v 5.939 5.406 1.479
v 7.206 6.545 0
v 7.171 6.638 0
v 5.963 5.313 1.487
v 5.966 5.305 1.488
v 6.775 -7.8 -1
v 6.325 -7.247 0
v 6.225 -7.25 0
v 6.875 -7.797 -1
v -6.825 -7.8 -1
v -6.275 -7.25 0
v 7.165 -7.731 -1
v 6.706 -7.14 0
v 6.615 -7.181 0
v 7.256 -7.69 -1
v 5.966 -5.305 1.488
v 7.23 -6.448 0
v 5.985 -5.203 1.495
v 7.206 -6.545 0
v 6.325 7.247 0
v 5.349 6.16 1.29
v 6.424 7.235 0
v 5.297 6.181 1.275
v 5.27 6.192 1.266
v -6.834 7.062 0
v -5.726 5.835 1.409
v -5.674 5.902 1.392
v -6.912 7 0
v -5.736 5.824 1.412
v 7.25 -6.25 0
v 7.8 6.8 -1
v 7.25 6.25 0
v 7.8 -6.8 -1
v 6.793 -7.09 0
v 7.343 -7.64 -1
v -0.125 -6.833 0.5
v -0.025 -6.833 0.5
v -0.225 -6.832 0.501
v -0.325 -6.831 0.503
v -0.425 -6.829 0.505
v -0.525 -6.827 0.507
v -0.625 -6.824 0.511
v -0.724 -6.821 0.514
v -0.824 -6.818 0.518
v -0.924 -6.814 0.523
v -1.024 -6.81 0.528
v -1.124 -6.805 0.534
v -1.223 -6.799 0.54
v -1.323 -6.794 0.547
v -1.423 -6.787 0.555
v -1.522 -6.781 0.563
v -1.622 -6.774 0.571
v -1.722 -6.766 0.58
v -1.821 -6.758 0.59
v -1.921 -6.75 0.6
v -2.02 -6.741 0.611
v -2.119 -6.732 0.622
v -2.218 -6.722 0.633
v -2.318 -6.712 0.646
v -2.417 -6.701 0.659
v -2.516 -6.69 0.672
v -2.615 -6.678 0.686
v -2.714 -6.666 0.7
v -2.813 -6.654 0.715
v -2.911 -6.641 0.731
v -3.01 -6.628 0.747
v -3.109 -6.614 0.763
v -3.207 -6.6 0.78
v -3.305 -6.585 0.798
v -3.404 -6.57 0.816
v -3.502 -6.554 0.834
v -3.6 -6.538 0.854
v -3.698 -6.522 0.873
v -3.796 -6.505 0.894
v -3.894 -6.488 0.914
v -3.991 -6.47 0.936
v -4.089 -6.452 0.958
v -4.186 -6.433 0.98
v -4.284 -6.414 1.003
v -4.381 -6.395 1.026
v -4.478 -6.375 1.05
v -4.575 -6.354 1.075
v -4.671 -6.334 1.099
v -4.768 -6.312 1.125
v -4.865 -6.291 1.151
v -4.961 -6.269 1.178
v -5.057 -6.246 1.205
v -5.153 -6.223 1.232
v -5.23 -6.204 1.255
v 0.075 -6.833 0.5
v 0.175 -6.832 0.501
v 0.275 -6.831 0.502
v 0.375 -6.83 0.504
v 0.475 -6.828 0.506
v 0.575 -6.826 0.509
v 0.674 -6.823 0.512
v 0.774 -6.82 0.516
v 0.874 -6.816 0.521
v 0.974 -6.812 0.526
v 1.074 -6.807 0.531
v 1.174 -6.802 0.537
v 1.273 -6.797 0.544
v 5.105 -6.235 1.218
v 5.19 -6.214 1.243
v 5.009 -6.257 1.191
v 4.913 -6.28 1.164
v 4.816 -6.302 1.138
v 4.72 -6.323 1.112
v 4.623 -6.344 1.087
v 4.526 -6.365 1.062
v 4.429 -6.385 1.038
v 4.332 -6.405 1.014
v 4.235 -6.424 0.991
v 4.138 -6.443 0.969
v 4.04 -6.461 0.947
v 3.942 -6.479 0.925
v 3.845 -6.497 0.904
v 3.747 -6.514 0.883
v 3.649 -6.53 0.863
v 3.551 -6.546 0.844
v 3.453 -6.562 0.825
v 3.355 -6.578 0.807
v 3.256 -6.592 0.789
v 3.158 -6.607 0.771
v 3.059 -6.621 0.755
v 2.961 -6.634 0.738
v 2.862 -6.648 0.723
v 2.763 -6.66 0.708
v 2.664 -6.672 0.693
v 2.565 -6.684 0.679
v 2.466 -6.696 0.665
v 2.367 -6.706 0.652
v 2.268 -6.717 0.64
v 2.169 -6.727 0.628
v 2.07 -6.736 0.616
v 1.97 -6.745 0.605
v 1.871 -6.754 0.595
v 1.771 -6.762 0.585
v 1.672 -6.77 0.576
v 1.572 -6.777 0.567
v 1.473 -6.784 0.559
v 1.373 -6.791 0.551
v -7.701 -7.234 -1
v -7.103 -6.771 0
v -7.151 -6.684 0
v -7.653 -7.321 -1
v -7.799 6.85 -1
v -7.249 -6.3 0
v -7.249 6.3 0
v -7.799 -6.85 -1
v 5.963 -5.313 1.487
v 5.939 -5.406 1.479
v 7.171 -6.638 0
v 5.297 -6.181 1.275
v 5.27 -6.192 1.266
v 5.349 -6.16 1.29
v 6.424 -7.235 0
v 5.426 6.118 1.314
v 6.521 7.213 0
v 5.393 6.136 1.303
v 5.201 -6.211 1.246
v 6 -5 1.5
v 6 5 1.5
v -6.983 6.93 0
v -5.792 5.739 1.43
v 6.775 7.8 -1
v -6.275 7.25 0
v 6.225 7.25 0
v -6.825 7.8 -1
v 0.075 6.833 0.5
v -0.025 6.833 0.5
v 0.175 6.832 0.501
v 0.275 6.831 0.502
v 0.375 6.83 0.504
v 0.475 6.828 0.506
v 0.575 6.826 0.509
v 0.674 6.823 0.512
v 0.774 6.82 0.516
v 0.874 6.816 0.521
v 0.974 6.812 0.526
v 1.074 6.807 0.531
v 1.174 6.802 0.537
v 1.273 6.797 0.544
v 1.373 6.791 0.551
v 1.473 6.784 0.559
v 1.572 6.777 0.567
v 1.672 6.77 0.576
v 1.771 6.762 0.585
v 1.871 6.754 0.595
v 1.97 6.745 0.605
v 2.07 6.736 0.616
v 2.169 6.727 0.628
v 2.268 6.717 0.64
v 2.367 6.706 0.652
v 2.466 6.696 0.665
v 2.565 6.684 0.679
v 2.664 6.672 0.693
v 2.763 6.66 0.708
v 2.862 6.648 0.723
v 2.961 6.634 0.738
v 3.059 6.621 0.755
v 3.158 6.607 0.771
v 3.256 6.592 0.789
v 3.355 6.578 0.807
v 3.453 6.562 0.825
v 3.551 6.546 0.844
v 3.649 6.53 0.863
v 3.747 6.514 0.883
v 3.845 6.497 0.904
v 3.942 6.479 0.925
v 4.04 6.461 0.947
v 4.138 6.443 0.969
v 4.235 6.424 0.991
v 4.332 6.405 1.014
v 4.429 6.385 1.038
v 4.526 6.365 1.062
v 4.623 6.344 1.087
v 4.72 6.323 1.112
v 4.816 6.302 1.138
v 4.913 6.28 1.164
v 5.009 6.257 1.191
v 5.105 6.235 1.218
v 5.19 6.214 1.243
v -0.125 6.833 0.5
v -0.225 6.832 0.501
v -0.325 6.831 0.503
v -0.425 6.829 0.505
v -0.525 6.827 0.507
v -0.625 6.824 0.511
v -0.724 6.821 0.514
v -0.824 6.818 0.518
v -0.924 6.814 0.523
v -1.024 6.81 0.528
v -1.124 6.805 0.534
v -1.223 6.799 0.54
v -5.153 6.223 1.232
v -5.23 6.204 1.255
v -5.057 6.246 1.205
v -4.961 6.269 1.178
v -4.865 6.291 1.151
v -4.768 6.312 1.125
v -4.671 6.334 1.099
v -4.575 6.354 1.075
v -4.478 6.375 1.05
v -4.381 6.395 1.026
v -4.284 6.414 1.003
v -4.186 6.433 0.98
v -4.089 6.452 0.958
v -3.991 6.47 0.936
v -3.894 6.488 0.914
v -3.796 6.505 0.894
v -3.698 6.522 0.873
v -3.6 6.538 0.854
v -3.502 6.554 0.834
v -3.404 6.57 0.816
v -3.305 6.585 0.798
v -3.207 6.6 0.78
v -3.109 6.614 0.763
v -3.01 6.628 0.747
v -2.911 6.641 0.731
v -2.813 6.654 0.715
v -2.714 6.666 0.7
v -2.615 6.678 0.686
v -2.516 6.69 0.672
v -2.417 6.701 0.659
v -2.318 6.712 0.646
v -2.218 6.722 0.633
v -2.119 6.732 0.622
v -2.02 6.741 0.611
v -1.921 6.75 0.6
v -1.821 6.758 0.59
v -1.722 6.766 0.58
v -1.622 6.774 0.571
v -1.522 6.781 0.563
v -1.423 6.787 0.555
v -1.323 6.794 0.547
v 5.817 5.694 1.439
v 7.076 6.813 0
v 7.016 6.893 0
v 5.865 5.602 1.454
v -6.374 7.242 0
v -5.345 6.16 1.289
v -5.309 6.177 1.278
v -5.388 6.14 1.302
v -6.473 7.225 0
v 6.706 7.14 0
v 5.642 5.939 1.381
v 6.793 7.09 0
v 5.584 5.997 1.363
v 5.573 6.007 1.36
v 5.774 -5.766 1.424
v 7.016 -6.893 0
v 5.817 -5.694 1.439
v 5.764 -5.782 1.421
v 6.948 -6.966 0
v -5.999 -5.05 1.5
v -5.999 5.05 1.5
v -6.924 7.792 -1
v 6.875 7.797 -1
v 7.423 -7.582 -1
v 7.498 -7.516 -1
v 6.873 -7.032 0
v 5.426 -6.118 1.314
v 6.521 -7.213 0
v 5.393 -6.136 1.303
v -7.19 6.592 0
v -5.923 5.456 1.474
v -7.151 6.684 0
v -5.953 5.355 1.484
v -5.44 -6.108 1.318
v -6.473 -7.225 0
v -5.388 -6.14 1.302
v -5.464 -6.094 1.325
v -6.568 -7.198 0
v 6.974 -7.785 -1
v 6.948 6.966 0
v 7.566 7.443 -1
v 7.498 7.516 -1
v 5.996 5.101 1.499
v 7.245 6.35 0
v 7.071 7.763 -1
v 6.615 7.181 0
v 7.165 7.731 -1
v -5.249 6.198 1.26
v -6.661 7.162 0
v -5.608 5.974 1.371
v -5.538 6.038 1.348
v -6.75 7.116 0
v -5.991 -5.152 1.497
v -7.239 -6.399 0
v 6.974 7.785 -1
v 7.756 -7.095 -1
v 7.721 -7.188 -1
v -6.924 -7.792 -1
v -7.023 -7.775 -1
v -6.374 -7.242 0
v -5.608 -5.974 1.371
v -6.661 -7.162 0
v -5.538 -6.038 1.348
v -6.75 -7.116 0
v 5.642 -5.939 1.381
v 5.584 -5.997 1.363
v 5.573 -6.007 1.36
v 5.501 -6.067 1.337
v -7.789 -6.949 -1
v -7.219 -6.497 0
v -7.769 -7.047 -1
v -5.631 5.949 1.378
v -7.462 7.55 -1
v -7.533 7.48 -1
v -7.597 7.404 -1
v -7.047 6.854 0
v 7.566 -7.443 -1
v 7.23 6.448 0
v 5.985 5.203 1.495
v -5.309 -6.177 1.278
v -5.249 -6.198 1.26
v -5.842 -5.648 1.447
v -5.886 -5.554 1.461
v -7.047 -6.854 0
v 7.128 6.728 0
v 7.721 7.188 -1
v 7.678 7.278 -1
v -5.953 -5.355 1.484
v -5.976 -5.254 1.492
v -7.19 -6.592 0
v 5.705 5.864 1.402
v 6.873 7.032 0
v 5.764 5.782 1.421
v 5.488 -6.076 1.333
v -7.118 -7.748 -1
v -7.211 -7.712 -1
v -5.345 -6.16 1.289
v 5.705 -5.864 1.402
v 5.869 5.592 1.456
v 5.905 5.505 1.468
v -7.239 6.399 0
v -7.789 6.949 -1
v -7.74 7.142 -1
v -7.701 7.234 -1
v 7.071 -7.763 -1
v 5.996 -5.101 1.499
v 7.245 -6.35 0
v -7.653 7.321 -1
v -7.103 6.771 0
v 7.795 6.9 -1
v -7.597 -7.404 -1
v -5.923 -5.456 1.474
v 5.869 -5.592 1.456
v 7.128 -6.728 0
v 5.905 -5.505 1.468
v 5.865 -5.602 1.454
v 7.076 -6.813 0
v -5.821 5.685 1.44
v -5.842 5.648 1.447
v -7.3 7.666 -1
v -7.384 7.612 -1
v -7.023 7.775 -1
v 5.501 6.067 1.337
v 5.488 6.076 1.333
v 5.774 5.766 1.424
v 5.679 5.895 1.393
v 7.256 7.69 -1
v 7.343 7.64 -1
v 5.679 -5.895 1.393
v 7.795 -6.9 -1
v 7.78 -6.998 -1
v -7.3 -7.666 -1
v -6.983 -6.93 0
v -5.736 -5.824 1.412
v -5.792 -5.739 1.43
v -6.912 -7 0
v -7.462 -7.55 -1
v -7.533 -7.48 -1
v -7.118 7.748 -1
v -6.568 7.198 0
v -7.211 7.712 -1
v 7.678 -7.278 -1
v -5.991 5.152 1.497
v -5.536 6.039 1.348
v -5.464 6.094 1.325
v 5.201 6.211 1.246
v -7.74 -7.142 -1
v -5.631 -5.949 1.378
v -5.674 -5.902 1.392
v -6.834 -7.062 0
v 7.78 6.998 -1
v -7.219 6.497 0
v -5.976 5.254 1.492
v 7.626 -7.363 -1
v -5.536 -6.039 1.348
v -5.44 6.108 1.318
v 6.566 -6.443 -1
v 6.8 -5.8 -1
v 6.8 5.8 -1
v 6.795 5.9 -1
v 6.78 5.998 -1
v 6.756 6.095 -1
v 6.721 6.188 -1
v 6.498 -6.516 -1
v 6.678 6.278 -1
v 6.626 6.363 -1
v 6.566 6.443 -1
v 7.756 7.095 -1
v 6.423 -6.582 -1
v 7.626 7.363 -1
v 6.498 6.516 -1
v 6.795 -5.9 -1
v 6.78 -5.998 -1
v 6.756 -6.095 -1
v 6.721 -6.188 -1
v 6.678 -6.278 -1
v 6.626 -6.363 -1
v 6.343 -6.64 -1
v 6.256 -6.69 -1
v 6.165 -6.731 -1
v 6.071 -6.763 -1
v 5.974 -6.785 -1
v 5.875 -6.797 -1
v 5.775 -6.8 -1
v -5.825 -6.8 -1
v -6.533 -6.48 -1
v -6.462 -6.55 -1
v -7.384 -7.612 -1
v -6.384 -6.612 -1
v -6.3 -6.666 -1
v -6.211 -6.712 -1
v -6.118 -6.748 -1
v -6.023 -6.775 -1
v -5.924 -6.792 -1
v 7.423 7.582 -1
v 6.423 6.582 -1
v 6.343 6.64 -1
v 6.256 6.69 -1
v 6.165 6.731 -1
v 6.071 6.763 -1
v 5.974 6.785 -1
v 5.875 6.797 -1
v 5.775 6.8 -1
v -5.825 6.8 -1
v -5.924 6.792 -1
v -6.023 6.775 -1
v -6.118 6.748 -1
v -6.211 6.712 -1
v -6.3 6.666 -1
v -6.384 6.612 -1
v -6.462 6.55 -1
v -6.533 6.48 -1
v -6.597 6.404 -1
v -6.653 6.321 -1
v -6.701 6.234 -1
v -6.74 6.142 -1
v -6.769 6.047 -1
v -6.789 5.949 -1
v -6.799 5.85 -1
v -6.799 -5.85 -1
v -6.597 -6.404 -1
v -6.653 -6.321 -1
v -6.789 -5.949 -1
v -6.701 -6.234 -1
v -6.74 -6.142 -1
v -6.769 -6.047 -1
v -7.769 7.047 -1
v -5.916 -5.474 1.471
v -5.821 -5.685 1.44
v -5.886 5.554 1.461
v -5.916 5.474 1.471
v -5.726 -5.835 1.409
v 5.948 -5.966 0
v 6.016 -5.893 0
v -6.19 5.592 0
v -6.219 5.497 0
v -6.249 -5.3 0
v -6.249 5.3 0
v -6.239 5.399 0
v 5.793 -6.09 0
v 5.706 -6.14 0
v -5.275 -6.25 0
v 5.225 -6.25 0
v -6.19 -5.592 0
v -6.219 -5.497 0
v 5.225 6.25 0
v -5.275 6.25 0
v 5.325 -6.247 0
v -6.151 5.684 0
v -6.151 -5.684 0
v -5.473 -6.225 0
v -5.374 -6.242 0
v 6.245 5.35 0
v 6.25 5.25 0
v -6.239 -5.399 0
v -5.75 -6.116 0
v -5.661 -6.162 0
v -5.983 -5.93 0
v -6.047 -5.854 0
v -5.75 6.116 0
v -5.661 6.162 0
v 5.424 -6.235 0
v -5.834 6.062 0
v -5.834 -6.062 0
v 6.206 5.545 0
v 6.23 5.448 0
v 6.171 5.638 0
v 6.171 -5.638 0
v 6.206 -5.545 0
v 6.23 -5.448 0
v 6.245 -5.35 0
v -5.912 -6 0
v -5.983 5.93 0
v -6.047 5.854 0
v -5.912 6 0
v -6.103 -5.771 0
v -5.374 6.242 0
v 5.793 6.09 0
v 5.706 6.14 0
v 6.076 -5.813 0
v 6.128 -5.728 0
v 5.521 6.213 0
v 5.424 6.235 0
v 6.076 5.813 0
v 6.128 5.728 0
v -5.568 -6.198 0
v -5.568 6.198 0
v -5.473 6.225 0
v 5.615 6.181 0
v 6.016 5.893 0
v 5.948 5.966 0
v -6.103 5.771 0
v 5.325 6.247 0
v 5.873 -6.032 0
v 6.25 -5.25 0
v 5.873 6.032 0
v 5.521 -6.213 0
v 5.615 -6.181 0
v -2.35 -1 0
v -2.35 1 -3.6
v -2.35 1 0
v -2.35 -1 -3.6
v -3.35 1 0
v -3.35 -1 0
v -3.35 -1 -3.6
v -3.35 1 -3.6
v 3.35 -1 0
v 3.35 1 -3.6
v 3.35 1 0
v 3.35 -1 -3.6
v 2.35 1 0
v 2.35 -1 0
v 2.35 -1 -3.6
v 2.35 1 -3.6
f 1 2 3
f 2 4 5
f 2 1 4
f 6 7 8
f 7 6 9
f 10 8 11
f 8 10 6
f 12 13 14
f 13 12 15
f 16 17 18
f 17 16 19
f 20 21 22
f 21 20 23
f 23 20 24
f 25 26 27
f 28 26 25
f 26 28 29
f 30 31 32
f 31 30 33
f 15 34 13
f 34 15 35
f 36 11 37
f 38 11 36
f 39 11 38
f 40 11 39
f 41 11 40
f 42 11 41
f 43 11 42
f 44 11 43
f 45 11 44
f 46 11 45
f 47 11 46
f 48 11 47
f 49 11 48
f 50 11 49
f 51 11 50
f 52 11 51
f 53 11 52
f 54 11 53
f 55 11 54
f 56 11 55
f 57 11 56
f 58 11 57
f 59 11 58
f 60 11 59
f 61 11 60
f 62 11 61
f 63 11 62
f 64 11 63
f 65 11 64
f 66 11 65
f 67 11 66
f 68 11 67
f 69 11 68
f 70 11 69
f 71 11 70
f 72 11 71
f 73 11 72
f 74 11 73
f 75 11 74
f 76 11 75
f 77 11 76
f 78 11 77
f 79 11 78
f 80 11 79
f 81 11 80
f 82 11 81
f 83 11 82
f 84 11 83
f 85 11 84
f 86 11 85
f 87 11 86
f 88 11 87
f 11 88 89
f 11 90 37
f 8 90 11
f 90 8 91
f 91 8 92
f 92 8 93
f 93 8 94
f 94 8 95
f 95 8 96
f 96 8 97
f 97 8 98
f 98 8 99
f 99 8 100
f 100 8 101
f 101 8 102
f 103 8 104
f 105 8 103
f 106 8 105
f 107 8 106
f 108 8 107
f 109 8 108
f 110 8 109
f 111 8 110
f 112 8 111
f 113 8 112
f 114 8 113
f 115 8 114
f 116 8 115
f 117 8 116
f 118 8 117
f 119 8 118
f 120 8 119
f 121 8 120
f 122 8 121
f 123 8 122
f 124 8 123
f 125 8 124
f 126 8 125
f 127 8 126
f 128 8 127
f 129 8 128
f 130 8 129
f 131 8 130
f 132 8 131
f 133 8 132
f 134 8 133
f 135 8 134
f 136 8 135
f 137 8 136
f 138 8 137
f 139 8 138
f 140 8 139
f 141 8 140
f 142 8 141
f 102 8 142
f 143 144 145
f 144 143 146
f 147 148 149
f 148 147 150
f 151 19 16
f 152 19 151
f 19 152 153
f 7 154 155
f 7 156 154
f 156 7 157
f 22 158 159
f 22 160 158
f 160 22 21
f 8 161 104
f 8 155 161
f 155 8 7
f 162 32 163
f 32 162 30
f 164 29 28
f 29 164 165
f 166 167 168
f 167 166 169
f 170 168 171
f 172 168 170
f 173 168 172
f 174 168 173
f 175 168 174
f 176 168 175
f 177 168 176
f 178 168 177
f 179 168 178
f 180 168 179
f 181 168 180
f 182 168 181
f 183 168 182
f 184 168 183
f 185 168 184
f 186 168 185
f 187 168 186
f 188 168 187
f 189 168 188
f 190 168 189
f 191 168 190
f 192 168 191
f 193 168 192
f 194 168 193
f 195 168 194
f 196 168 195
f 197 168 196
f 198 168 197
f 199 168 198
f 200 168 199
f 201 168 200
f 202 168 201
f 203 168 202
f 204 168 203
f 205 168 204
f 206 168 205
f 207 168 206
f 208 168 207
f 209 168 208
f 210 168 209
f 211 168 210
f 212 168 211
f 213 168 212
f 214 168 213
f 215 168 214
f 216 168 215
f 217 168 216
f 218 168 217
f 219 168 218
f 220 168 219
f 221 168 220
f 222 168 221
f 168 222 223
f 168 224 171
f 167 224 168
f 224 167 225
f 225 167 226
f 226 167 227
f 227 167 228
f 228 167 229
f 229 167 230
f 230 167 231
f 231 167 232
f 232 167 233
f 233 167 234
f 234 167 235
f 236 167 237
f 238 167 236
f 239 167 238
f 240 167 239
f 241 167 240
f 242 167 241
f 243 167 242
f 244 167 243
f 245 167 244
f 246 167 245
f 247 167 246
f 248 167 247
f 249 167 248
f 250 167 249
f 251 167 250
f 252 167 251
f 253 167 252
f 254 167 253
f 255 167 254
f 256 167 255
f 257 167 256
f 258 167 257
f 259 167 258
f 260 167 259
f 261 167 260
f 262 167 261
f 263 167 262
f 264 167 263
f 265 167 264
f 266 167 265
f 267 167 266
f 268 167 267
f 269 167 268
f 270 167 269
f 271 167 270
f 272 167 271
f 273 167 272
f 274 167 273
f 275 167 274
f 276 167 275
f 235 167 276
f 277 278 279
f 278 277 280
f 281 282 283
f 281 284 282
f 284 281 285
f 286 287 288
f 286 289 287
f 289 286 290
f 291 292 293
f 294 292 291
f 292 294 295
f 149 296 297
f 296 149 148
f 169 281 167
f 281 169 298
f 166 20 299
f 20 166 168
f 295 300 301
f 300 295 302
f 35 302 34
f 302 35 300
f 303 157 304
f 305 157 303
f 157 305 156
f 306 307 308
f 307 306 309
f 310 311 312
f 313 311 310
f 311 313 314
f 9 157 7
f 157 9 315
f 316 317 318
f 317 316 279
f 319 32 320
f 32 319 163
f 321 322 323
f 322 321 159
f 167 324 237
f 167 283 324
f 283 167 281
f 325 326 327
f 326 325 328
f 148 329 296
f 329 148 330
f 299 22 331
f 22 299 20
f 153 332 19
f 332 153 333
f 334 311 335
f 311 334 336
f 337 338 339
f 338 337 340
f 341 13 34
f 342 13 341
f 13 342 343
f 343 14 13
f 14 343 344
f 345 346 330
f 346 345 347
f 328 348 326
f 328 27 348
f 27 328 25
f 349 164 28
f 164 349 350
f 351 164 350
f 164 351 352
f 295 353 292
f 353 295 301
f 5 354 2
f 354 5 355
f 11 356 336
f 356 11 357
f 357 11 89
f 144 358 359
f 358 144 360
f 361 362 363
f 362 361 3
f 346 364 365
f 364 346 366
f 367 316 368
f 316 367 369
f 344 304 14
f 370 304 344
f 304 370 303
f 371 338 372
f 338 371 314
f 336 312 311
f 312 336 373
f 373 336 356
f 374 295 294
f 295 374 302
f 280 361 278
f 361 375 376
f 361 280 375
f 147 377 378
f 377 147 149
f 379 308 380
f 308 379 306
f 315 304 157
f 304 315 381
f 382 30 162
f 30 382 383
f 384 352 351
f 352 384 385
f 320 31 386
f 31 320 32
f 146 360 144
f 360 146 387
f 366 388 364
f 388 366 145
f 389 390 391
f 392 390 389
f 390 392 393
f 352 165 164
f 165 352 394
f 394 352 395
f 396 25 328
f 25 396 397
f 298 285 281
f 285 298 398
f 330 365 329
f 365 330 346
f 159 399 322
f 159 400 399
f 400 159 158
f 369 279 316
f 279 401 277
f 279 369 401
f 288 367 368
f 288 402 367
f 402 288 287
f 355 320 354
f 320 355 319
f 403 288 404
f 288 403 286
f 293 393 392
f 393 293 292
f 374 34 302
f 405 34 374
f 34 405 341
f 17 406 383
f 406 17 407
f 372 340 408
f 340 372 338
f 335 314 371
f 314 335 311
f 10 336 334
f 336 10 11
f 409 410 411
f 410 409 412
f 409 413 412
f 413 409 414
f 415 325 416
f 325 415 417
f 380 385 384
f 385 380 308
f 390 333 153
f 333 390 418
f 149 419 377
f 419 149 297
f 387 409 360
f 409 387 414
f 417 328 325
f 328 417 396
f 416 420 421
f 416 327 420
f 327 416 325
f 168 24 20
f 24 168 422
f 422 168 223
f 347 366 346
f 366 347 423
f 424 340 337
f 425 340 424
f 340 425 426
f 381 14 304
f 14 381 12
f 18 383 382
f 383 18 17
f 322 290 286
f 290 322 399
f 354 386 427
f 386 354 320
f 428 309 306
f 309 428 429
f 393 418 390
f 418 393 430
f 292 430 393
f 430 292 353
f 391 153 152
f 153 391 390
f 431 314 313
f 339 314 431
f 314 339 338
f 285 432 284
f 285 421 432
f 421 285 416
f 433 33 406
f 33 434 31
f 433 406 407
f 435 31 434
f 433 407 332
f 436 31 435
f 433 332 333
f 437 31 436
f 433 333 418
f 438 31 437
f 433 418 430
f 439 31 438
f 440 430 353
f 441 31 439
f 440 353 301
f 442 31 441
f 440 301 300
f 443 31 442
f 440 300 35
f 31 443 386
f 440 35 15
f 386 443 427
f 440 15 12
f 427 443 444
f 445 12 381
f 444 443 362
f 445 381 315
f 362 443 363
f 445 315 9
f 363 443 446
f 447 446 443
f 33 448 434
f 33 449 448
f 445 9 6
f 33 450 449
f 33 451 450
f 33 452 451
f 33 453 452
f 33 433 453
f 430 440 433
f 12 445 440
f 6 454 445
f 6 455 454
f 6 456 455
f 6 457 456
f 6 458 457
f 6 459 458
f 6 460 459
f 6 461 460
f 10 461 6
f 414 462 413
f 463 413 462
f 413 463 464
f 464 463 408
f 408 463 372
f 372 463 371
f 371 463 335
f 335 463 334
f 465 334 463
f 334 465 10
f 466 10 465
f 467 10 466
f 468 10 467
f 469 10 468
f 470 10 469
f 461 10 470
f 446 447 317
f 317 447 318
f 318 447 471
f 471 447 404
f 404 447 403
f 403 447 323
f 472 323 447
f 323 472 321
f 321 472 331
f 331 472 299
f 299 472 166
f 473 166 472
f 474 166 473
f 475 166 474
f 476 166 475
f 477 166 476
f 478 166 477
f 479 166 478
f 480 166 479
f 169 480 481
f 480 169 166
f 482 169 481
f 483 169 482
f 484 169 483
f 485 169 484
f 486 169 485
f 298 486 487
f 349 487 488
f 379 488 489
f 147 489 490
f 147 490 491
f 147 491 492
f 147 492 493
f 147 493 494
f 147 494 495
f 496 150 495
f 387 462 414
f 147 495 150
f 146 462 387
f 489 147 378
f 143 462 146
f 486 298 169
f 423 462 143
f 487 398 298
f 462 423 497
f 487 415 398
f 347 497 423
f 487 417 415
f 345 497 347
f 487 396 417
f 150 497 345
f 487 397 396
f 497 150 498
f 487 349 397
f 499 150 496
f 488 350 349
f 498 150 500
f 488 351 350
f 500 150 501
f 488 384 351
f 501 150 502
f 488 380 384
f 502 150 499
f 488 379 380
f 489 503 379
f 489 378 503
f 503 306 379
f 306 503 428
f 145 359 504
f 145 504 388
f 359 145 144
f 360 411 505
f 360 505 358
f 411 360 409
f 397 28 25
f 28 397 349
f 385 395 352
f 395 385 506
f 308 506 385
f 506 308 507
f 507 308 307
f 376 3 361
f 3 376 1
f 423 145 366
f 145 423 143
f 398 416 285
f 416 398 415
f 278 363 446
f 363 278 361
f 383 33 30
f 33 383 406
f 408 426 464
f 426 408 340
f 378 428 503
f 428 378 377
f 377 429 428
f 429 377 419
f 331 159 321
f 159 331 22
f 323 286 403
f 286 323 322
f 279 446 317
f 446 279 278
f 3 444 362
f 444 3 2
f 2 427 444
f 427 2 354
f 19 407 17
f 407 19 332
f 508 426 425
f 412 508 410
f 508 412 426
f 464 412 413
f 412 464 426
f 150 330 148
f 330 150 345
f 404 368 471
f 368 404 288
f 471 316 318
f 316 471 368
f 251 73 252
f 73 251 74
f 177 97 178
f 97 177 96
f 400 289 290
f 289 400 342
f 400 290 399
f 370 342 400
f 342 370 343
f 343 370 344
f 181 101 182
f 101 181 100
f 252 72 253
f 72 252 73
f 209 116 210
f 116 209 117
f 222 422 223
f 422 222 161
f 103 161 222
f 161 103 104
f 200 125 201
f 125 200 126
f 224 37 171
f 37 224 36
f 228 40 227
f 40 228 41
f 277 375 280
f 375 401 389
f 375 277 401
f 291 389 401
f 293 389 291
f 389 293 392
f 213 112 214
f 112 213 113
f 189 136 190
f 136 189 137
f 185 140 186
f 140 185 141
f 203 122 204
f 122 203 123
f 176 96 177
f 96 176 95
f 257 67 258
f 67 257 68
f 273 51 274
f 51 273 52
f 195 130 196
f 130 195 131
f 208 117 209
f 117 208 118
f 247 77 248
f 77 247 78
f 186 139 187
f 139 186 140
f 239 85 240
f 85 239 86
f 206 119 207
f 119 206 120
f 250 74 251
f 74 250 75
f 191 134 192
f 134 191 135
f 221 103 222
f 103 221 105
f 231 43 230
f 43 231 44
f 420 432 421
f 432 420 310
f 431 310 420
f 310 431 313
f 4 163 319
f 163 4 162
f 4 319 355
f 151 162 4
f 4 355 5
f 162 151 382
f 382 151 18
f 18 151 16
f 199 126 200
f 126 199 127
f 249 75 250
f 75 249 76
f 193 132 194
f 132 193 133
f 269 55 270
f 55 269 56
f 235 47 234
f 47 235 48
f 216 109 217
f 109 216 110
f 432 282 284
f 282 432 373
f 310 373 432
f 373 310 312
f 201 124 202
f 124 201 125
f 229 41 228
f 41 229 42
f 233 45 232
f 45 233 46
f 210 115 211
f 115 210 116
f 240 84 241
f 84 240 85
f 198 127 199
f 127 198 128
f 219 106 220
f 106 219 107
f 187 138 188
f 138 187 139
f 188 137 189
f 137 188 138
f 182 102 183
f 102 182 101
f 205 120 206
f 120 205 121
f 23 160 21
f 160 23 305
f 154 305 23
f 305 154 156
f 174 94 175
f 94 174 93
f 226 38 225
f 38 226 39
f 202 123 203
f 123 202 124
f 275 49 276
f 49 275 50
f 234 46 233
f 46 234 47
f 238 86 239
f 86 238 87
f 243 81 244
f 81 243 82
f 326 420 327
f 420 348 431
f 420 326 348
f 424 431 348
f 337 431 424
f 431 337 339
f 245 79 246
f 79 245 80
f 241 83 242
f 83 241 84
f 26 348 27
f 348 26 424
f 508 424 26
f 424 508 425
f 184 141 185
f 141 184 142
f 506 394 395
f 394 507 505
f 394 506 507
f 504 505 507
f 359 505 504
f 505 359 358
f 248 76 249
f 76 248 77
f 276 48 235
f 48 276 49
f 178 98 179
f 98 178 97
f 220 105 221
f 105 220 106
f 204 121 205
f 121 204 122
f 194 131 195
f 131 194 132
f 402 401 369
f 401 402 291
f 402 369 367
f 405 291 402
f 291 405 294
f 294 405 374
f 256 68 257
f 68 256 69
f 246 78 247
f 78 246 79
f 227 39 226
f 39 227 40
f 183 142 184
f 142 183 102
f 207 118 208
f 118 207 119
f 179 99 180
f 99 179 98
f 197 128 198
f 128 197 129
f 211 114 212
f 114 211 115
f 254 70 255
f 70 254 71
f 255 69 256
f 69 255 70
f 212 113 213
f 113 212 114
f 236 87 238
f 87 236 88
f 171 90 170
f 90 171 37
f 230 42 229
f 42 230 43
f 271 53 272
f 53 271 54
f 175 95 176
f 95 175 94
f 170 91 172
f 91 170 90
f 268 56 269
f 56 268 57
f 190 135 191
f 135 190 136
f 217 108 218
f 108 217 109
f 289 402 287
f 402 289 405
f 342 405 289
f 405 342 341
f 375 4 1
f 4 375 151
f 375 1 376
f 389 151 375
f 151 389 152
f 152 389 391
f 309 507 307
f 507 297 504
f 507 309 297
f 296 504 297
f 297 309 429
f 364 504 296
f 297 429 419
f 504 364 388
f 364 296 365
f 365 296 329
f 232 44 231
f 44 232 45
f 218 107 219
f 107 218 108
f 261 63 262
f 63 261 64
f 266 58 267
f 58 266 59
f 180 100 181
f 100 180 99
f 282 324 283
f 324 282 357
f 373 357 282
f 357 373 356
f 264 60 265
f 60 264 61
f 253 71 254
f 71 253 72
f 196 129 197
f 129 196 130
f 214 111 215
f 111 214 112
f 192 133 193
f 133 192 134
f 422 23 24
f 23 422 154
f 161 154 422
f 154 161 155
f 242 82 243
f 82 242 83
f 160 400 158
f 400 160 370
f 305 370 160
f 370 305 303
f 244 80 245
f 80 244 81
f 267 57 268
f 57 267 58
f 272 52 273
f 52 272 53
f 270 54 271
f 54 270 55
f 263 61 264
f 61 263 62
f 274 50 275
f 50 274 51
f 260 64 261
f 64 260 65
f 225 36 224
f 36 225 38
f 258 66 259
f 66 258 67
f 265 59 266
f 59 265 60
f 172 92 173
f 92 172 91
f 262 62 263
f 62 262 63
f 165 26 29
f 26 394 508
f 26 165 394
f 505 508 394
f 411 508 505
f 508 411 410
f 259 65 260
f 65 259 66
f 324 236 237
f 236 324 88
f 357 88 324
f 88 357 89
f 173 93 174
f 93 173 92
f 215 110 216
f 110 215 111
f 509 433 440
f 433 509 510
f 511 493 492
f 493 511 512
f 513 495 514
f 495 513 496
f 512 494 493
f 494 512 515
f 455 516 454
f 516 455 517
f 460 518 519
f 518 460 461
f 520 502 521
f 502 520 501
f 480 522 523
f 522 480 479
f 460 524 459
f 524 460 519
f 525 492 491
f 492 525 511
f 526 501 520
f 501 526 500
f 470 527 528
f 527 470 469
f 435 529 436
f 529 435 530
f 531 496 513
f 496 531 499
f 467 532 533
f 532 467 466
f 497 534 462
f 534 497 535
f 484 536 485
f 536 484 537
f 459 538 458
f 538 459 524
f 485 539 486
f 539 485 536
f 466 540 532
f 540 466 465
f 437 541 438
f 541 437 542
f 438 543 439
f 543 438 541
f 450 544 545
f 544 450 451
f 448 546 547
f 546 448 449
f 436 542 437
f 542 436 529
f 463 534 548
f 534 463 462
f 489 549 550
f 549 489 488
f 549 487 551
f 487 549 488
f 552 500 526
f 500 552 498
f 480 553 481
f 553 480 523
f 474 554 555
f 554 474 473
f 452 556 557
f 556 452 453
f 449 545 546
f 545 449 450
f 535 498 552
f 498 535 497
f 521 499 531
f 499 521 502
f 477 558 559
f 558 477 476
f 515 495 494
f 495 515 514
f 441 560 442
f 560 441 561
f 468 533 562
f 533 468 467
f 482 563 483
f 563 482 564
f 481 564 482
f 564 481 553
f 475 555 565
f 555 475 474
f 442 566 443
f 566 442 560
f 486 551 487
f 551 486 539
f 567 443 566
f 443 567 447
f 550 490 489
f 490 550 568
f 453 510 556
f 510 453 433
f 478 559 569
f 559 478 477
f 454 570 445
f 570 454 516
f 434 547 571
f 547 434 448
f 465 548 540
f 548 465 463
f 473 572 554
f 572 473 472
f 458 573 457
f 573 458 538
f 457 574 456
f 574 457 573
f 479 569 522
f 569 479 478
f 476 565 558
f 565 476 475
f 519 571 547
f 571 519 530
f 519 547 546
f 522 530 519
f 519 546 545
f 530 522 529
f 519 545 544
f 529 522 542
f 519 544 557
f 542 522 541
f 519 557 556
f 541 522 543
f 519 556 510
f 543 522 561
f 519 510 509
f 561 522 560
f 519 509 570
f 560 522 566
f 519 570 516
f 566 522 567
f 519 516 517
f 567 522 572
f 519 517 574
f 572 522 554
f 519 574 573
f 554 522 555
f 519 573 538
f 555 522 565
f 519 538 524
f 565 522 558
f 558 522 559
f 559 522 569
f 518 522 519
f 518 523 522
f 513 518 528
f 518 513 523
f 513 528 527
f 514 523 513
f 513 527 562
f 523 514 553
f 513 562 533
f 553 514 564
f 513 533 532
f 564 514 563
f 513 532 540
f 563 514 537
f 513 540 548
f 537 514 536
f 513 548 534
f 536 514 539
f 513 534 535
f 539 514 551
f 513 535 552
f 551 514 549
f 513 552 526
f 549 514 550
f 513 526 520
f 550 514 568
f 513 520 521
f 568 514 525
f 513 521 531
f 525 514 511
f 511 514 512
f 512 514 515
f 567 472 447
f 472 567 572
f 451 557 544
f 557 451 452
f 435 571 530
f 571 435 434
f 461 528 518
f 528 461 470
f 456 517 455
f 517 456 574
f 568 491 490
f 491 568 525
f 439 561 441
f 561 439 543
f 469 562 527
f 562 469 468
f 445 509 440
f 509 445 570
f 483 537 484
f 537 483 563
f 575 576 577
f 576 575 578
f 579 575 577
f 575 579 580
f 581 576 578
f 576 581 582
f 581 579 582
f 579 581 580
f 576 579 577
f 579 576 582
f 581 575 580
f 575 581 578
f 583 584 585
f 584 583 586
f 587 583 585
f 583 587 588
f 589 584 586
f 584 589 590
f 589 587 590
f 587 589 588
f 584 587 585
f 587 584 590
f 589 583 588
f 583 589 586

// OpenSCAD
$fs = 0.1;
$fa = 0.25;
DEBUG = false;

// 角丸のプレート
module rounded_plate(x, y, r) {
  thickness = 0.0001;
  minkowski () {
    cube([x-r*2, y-r*2, thickness], center = true);
    cylinder(r = r, h = thickness);
  }
}

// キーキャップの外観を定義
module keycap1_outer_shape(bottom_size, middle_size, top_size, top_height, skert_height) {
  hull () {
    translate([0, 0, top_height])
    rounded_plate(top_size, top_size, 1);
    
    if(middle_size > 0) {
      translate([0, 0, 0])
      rounded_plate(middle_size, middle_size, 1);
    }
    
    translate([0, 0, -skert_height])
    rounded_plate(bottom_size, bottom_size, 1);
  }
}

module head_depress(top_size, top_height, depth) {
  // https://qiita.com/zk_phi/items/ab99315ebaef66e84aa0
  function dish_r(w, d) = (w * w + 4 * d * d) / (8 * d);
  
  hull() {
    angle = 0;
    translate([0, 0, top_height]);
    rotate([- angle, 0, 0])
    translate([0, 0, dish_r(top_size, depth) - depth+top_height])
    rotate([90, 0, 0])
    cylinder(r = dish_r(top_size, depth), h = 60, /* 適当に十分な長さ */ center = true);
  }
}

module keycap_shape () {
  thickness = 1.0;
  
  bottom_size = 15.6;
  middle_size = 14.5;
  top_height = 1.5;
  top_size = 12;
  top_depth = 1.0;
  skert_height = 1.0; 

  
  difference () {
    // 外形
    keycap1_outer_shape(bottom_size, middle_size, top_size, top_height, skert_height);
    
    // 上部の凹み
    head_depress(top_size, 1.5, 1);

    // くり抜くための外形
    keycap1_outer_shape(bottom_size - thickness * 2, middle_size - thickness * 2, top_size - thickness * 2, 0, skert_height);
  }
}

module kailh_choc_v1_stem() {
  leg_length = 3.6;
  translate([-2.85, 0, -leg_length/2])
  cube([1, 2, leg_length], center=true);
  translate([2.85, 0, -leg_length/2])
  cube([1, 2, leg_length], center=true);
}


if(DEBUG) {
  // 断面図
  difference() {
    union() {
      keycap_shape();
      kailh_choc_v1_stem();
      translate([0,0,-3.3]) import("../3rd_parties/choc_v1_switch.stl", convexity=10);
    }
    translate([-10, 0, -10]) cube([20, 20, 20]);
  }
}
else {
    keycap_shape();
    kailh_choc_v1_stem();
}

// https://qiita.com/zk_phi/items/ab99315ebaef66e84aa0
// https://bebebe.hatenablog.jp/entry/2019/06/04/232501
// https://qiita.com/zk_phi/items/ab99315ebaef66e84aa0
